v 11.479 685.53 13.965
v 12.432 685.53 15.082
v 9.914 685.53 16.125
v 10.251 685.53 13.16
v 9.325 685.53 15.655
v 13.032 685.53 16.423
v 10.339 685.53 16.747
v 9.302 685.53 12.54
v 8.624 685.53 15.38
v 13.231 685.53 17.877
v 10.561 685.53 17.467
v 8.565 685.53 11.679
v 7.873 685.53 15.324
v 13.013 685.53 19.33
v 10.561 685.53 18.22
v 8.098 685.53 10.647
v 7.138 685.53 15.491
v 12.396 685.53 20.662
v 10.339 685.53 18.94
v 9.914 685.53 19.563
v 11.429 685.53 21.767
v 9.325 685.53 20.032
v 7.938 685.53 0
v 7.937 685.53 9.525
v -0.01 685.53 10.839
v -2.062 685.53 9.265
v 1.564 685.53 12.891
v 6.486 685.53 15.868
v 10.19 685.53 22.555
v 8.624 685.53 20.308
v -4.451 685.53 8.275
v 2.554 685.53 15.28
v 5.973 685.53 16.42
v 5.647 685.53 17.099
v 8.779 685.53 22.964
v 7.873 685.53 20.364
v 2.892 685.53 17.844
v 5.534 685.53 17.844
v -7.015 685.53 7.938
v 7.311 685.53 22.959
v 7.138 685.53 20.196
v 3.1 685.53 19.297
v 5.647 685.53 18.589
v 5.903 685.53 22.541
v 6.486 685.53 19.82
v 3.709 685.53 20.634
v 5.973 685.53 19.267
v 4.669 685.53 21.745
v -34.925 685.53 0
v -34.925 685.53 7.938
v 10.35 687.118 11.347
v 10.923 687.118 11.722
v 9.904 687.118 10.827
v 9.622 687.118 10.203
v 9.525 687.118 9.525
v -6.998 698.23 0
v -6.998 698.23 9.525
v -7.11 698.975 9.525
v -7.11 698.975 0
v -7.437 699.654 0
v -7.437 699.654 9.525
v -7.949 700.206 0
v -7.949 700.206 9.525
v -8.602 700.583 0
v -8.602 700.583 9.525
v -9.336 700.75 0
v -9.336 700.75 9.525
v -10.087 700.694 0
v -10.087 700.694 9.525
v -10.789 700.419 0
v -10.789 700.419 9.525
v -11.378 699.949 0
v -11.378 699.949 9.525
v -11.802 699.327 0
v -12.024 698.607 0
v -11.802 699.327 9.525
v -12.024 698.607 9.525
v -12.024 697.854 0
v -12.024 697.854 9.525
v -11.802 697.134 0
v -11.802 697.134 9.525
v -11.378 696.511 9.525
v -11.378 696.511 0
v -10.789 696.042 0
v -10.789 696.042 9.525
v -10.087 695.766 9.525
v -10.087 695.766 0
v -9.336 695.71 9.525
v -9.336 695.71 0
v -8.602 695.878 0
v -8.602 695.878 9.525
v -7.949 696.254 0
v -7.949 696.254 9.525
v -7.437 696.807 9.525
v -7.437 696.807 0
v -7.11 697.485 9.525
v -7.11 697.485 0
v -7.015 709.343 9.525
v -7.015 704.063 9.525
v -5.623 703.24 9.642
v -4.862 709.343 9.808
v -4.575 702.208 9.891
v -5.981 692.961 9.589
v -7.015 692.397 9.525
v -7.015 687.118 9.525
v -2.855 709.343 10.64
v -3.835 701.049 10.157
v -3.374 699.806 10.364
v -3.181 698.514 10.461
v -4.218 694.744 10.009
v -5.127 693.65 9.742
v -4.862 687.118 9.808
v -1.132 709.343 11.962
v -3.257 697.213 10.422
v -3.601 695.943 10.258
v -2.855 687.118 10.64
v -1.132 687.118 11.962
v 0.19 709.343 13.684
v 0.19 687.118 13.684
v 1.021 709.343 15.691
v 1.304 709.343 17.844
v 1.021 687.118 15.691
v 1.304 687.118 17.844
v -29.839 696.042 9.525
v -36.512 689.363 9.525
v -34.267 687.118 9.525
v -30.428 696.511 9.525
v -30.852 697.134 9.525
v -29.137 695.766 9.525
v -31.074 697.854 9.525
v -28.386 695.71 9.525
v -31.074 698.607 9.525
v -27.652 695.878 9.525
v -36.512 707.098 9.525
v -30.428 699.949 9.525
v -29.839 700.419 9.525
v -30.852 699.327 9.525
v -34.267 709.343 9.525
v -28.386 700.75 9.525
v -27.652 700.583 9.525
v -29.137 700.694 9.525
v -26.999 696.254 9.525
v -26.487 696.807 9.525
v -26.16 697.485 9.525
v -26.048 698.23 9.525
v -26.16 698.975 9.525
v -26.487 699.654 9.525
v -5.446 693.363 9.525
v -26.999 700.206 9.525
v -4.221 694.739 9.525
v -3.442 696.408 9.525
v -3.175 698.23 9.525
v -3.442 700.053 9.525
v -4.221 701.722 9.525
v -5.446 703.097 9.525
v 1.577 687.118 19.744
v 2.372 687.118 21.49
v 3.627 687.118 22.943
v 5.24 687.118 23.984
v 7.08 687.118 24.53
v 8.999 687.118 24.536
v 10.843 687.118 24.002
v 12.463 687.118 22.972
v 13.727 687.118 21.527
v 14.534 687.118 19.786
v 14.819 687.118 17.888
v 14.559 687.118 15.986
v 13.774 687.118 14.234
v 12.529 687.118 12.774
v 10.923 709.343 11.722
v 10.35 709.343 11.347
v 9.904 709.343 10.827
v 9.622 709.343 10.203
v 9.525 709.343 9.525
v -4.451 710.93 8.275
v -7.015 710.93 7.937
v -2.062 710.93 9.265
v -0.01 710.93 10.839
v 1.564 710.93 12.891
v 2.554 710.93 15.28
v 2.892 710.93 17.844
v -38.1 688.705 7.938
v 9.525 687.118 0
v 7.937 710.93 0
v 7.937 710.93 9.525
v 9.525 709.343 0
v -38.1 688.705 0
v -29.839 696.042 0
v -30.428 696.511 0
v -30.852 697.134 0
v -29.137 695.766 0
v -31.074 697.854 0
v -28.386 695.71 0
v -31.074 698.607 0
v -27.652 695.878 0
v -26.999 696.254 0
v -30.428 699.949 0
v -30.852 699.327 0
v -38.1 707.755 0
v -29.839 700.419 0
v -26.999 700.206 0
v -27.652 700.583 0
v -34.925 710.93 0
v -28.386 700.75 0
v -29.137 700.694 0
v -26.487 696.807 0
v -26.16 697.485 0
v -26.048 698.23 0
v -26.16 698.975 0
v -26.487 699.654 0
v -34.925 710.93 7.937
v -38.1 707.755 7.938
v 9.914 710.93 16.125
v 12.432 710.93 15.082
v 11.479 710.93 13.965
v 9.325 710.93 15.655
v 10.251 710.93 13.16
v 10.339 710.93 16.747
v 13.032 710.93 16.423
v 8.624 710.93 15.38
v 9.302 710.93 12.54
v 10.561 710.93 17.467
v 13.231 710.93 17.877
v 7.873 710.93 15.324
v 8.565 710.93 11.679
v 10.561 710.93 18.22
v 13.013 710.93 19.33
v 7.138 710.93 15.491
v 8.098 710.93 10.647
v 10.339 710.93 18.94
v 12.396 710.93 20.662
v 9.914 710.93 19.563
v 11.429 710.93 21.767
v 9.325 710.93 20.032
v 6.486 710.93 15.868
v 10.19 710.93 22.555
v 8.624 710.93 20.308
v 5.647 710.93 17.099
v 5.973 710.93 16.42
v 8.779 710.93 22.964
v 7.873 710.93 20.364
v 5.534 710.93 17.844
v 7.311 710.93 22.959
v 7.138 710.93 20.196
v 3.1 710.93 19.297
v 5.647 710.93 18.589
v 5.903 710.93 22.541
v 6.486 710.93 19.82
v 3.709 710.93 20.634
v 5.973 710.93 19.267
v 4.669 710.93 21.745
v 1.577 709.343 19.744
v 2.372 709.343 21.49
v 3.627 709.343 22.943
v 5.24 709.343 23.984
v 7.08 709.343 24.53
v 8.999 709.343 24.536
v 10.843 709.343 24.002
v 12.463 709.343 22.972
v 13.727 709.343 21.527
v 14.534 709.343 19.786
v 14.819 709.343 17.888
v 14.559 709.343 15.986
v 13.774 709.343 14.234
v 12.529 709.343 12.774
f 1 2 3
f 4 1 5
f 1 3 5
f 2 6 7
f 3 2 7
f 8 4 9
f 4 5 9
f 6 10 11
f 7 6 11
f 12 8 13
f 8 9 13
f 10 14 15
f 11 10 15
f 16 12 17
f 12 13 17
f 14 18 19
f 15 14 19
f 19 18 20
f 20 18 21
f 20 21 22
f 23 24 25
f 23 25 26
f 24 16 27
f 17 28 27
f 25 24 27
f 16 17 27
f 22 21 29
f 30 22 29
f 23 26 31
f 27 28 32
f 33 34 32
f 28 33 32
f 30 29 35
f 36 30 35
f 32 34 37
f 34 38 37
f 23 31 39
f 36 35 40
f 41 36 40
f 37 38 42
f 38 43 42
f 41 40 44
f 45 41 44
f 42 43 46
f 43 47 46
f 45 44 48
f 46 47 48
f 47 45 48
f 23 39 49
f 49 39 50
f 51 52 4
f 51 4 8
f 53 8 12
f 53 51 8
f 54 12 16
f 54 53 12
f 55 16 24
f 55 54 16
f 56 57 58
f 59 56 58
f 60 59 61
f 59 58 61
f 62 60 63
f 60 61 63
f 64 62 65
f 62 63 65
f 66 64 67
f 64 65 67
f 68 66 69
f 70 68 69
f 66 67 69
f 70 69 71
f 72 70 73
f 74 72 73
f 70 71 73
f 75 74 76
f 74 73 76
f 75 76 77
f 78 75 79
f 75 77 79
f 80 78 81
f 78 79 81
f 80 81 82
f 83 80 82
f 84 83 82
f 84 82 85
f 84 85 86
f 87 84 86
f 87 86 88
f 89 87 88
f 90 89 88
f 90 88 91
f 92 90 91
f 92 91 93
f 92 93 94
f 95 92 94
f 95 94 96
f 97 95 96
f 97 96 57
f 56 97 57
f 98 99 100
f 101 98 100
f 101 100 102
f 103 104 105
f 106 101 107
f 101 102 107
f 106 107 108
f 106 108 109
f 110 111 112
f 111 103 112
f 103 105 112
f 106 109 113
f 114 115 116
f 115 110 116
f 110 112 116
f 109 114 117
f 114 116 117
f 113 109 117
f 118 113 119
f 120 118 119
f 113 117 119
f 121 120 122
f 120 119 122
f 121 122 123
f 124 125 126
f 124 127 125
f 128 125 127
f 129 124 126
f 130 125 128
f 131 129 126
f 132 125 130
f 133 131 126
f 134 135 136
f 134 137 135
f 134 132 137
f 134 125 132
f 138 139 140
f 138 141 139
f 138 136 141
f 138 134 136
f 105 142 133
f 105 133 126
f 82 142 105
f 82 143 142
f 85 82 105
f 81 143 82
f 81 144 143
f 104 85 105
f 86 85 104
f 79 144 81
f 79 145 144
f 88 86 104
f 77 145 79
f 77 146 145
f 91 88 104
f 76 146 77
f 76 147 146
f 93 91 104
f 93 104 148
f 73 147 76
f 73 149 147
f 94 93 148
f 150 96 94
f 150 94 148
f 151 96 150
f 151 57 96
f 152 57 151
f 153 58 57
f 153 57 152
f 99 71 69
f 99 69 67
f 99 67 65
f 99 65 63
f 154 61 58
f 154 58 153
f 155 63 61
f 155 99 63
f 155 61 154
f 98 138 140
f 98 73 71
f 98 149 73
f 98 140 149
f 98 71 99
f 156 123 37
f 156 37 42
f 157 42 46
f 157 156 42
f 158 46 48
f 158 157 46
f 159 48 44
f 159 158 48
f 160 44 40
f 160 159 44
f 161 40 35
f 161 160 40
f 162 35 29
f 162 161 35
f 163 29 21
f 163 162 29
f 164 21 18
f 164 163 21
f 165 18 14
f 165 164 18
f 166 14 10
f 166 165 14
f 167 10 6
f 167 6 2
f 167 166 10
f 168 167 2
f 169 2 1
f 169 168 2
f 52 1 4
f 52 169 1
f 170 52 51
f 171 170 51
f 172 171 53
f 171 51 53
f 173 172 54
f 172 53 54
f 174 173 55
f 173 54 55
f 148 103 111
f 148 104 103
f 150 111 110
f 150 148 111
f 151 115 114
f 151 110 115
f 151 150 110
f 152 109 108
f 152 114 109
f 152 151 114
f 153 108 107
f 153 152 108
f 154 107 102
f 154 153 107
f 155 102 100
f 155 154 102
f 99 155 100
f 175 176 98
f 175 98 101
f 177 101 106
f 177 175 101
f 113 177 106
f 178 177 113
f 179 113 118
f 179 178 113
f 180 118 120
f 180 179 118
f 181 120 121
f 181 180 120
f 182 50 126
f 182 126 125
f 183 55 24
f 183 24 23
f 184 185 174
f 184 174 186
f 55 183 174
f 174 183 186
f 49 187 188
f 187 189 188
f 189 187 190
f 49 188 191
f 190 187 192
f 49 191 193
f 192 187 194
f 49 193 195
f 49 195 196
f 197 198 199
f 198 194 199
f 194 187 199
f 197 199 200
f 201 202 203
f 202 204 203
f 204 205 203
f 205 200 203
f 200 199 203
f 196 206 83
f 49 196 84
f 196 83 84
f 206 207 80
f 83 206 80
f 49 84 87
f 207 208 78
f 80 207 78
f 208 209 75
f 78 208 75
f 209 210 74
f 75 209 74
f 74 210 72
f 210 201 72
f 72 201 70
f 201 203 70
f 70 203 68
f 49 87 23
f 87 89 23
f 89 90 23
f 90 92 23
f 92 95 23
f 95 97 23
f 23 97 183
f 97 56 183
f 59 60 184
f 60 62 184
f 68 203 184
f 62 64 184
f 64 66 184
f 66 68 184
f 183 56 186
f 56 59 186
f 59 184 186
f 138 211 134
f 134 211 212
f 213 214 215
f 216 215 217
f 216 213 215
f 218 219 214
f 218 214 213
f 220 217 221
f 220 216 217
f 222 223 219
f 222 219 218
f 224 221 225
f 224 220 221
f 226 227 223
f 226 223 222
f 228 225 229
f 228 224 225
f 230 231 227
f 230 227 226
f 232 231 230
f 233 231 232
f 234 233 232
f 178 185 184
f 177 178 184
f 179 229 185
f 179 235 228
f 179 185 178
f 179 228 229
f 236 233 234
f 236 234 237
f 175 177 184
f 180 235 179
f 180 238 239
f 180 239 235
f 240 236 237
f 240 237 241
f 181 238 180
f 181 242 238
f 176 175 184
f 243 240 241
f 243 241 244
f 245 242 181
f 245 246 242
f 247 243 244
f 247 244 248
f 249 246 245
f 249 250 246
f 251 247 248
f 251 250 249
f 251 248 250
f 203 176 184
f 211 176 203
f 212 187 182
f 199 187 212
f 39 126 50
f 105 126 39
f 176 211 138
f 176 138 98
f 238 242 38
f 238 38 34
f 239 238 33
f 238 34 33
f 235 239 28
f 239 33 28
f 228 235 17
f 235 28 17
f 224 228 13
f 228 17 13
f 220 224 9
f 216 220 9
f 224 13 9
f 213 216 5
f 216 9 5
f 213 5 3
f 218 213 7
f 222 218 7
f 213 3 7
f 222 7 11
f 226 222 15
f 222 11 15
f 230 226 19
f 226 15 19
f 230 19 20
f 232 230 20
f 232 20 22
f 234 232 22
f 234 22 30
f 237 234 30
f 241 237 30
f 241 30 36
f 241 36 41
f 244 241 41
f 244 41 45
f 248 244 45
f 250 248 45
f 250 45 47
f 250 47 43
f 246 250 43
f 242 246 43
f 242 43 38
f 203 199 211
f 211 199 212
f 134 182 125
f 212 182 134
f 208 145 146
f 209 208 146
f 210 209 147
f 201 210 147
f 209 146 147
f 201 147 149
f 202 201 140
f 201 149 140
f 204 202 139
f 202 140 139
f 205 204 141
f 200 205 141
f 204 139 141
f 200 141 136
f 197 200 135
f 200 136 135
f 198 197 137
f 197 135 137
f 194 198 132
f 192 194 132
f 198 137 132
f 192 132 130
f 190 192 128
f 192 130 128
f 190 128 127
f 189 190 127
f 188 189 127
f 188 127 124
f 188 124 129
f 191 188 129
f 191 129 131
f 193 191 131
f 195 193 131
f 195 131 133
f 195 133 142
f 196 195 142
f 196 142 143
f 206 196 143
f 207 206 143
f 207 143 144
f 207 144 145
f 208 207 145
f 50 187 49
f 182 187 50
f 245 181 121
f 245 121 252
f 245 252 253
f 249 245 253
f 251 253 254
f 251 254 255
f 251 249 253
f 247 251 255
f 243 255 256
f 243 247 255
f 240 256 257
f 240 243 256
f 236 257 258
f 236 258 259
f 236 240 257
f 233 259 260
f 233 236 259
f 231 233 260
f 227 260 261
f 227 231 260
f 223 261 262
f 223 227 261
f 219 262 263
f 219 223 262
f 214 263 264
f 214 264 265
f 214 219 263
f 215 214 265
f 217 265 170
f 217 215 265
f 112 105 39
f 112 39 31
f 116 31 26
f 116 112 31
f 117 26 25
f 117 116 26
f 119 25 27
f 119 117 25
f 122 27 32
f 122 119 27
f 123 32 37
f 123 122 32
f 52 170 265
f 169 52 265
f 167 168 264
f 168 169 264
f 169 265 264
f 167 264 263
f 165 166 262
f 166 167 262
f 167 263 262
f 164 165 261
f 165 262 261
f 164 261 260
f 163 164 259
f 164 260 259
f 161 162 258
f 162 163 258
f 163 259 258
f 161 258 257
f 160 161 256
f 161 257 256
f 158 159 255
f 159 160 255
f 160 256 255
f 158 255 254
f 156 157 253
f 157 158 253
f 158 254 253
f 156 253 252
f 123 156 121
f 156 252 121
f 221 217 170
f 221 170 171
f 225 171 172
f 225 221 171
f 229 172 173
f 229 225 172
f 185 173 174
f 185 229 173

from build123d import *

# Parameters (mm, degrees)
SKETCH1_W                  = 47.625
SKETCH1_H                  = 25.4
BOSS_EXTRUDE1_DEPTH        = 9.525
SKETCH2_R                  = 6.757528855
BOSS_EXTRUDE2_DEPTH        = 25.4
BOSS_EXTRUDE3_DEPTH        = 25.4
F_8_0_199_DIAMETER_HOLE1_D = 5.0546
CHAMFER1_SIZE              = 3.175
CHAMFER2_SIZE              = 1.5875
F_8_0_199_DIAMETER_HOLE2_D = 5.0546
CUT_EXTRUDE1_REACH         = 714.11
SKETCH11_R                 = 6.35


with BuildPart() as part:
    # Sketch1 → Boss-Extrude1 (new body)
    with BuildSketch(Plane.XY):
        with Locations((-14.2875, 698.230229864)):
            Rectangle(SKETCH1_W, SKETCH1_H)
    extrude(amount=BOSS_EXTRUDE1_DEPTH)



with BuildPart() as body_2:
    # Sketch2 → Boss-Extrude2 (new body)
    with BuildSketch(Plane(origin=(0, 710.930229864, 0), x_dir=(-1, 0, 0), z_dir=(0, -1, 0))):
        with Locations(Location((-8.061541228, -17.843768092, 0), (0, 0, 270))):
            Circle(SKETCH2_R)
    extrude(amount=BOSS_EXTRUDE2_DEPTH)


with BuildPart() as part_1:
    add(part.part)

    add(body_2.part)  # Boss-Extrude3 merges body 2
    # Sketch3 → Boss-Extrude3 (add)
    with BuildSketch(Plane.XZ.offset(-685.530229864)):
        with BuildLine():
            Line((9.525, 9.525), (-7.01475572, 9.525))
            ThreePointArc((-7.01475572, 9.525), (-1.132498391, 11.961510763), (1.304012372, 17.843768092))
            ThreePointArc((1.304012372, 17.843768092), (4.433439084, 12.142797029), (10.923230214, 11.722090841))
            ThreePointArc((10.923230214, 11.722090841), (9.904202194, 10.827138231), (9.525, 9.525))
        make_face()
    extrude(amount=-BOSS_EXTRUDE3_DEPTH)

    # #8 (0.199) Diameter Hole1 (through all)
    with Locations(Plane(origin=(0, 710.930229864, 0), x_dir=(1, 0, 0), z_dir=(0, 1, 0))):
        with Locations((8.061541228, -17.843768092)):
            f_8_0_199_diameter_hole1 = Hole(F_8_0_199_DIAMETER_HOLE1_D / 2)

    # Chamfer1
    chamfer1_edges = [part_1.edges().sort_by_distance(p)[0] for p in [
        (-38.1, 710.930229864, 4.7625),
        (-38.1, 685.530229864, 4.7625),
    ]]
    chamfer(chamfer1_edges, length=CHAMFER1_SIZE)

    # Chamfer2
    chamfer2_edges = [part_1.edges().sort_by_distance(p)[0] for p in [
        (-20.96987786, 710.930229864, 9.525),
        (9.904202194, 685.530229864, 10.827138231),
        (-1.132498391, 685.530229864, 11.961510763),
        (9.904202194, 710.930229864, 10.827138231),
        (-1.132498391, 710.930229864, 11.961510763),
        (11.689643371, 685.530229864, 23.544739156),
        (11.689643371, 710.930229864, 23.544739156),
        (-20.96987786, 685.530229864, 9.525),
        (-38.1, 698.230229864, 9.525),
        (-36.5125, 709.342729864, 9.525),
        (-36.5125, 687.117729864, 9.525),
        (9.525, 710.930229864, 4.7625),
        (9.525, 685.530229864, 4.7625),
    ]]
    chamfer(chamfer2_edges, length=CHAMFER2_SIZE)

    # Mirror2: #8 (0.199) Diameter Hole1 across plane
    add(f_8_0_199_diameter_hole1.mirror(Plane.ZX.offset(698.230229864)), mode=Mode.SUBTRACT)

    # #8 (0.199) Diameter Hole2 (through all)
    with Locations(Plane(origin=(0, 0, 0), x_dir=(-1, 0, 0), z_dir=(0, 0, -1))):
        with Locations((9.525, 698.230229864), (28.575, 698.230229864)):
            Hole(F_8_0_199_DIAMETER_HOLE2_D / 2)

    # Sketch11 → Cut-Extrude1 (cut, up to next)
    with BuildSketch(Plane.XY.offset(9.525), mode=Mode.PRIVATE) as cut_extrude1_sk1:
        with Locations((-9.525, 698.230229864)):
            Circle(SKETCH11_R)
    cut_extrude1_tool1 = extrude(cut_extrude1_sk1.sketch, amount=CUT_EXTRUDE1_REACH, mode=Mode.PRIVATE) & part_1.part
    add(cut_extrude1_tool1.solids().sort_by_distance((-9.525, 698.23023, 9.525))[0], mode=Mode.SUBTRACT)


solid = part_1.part
